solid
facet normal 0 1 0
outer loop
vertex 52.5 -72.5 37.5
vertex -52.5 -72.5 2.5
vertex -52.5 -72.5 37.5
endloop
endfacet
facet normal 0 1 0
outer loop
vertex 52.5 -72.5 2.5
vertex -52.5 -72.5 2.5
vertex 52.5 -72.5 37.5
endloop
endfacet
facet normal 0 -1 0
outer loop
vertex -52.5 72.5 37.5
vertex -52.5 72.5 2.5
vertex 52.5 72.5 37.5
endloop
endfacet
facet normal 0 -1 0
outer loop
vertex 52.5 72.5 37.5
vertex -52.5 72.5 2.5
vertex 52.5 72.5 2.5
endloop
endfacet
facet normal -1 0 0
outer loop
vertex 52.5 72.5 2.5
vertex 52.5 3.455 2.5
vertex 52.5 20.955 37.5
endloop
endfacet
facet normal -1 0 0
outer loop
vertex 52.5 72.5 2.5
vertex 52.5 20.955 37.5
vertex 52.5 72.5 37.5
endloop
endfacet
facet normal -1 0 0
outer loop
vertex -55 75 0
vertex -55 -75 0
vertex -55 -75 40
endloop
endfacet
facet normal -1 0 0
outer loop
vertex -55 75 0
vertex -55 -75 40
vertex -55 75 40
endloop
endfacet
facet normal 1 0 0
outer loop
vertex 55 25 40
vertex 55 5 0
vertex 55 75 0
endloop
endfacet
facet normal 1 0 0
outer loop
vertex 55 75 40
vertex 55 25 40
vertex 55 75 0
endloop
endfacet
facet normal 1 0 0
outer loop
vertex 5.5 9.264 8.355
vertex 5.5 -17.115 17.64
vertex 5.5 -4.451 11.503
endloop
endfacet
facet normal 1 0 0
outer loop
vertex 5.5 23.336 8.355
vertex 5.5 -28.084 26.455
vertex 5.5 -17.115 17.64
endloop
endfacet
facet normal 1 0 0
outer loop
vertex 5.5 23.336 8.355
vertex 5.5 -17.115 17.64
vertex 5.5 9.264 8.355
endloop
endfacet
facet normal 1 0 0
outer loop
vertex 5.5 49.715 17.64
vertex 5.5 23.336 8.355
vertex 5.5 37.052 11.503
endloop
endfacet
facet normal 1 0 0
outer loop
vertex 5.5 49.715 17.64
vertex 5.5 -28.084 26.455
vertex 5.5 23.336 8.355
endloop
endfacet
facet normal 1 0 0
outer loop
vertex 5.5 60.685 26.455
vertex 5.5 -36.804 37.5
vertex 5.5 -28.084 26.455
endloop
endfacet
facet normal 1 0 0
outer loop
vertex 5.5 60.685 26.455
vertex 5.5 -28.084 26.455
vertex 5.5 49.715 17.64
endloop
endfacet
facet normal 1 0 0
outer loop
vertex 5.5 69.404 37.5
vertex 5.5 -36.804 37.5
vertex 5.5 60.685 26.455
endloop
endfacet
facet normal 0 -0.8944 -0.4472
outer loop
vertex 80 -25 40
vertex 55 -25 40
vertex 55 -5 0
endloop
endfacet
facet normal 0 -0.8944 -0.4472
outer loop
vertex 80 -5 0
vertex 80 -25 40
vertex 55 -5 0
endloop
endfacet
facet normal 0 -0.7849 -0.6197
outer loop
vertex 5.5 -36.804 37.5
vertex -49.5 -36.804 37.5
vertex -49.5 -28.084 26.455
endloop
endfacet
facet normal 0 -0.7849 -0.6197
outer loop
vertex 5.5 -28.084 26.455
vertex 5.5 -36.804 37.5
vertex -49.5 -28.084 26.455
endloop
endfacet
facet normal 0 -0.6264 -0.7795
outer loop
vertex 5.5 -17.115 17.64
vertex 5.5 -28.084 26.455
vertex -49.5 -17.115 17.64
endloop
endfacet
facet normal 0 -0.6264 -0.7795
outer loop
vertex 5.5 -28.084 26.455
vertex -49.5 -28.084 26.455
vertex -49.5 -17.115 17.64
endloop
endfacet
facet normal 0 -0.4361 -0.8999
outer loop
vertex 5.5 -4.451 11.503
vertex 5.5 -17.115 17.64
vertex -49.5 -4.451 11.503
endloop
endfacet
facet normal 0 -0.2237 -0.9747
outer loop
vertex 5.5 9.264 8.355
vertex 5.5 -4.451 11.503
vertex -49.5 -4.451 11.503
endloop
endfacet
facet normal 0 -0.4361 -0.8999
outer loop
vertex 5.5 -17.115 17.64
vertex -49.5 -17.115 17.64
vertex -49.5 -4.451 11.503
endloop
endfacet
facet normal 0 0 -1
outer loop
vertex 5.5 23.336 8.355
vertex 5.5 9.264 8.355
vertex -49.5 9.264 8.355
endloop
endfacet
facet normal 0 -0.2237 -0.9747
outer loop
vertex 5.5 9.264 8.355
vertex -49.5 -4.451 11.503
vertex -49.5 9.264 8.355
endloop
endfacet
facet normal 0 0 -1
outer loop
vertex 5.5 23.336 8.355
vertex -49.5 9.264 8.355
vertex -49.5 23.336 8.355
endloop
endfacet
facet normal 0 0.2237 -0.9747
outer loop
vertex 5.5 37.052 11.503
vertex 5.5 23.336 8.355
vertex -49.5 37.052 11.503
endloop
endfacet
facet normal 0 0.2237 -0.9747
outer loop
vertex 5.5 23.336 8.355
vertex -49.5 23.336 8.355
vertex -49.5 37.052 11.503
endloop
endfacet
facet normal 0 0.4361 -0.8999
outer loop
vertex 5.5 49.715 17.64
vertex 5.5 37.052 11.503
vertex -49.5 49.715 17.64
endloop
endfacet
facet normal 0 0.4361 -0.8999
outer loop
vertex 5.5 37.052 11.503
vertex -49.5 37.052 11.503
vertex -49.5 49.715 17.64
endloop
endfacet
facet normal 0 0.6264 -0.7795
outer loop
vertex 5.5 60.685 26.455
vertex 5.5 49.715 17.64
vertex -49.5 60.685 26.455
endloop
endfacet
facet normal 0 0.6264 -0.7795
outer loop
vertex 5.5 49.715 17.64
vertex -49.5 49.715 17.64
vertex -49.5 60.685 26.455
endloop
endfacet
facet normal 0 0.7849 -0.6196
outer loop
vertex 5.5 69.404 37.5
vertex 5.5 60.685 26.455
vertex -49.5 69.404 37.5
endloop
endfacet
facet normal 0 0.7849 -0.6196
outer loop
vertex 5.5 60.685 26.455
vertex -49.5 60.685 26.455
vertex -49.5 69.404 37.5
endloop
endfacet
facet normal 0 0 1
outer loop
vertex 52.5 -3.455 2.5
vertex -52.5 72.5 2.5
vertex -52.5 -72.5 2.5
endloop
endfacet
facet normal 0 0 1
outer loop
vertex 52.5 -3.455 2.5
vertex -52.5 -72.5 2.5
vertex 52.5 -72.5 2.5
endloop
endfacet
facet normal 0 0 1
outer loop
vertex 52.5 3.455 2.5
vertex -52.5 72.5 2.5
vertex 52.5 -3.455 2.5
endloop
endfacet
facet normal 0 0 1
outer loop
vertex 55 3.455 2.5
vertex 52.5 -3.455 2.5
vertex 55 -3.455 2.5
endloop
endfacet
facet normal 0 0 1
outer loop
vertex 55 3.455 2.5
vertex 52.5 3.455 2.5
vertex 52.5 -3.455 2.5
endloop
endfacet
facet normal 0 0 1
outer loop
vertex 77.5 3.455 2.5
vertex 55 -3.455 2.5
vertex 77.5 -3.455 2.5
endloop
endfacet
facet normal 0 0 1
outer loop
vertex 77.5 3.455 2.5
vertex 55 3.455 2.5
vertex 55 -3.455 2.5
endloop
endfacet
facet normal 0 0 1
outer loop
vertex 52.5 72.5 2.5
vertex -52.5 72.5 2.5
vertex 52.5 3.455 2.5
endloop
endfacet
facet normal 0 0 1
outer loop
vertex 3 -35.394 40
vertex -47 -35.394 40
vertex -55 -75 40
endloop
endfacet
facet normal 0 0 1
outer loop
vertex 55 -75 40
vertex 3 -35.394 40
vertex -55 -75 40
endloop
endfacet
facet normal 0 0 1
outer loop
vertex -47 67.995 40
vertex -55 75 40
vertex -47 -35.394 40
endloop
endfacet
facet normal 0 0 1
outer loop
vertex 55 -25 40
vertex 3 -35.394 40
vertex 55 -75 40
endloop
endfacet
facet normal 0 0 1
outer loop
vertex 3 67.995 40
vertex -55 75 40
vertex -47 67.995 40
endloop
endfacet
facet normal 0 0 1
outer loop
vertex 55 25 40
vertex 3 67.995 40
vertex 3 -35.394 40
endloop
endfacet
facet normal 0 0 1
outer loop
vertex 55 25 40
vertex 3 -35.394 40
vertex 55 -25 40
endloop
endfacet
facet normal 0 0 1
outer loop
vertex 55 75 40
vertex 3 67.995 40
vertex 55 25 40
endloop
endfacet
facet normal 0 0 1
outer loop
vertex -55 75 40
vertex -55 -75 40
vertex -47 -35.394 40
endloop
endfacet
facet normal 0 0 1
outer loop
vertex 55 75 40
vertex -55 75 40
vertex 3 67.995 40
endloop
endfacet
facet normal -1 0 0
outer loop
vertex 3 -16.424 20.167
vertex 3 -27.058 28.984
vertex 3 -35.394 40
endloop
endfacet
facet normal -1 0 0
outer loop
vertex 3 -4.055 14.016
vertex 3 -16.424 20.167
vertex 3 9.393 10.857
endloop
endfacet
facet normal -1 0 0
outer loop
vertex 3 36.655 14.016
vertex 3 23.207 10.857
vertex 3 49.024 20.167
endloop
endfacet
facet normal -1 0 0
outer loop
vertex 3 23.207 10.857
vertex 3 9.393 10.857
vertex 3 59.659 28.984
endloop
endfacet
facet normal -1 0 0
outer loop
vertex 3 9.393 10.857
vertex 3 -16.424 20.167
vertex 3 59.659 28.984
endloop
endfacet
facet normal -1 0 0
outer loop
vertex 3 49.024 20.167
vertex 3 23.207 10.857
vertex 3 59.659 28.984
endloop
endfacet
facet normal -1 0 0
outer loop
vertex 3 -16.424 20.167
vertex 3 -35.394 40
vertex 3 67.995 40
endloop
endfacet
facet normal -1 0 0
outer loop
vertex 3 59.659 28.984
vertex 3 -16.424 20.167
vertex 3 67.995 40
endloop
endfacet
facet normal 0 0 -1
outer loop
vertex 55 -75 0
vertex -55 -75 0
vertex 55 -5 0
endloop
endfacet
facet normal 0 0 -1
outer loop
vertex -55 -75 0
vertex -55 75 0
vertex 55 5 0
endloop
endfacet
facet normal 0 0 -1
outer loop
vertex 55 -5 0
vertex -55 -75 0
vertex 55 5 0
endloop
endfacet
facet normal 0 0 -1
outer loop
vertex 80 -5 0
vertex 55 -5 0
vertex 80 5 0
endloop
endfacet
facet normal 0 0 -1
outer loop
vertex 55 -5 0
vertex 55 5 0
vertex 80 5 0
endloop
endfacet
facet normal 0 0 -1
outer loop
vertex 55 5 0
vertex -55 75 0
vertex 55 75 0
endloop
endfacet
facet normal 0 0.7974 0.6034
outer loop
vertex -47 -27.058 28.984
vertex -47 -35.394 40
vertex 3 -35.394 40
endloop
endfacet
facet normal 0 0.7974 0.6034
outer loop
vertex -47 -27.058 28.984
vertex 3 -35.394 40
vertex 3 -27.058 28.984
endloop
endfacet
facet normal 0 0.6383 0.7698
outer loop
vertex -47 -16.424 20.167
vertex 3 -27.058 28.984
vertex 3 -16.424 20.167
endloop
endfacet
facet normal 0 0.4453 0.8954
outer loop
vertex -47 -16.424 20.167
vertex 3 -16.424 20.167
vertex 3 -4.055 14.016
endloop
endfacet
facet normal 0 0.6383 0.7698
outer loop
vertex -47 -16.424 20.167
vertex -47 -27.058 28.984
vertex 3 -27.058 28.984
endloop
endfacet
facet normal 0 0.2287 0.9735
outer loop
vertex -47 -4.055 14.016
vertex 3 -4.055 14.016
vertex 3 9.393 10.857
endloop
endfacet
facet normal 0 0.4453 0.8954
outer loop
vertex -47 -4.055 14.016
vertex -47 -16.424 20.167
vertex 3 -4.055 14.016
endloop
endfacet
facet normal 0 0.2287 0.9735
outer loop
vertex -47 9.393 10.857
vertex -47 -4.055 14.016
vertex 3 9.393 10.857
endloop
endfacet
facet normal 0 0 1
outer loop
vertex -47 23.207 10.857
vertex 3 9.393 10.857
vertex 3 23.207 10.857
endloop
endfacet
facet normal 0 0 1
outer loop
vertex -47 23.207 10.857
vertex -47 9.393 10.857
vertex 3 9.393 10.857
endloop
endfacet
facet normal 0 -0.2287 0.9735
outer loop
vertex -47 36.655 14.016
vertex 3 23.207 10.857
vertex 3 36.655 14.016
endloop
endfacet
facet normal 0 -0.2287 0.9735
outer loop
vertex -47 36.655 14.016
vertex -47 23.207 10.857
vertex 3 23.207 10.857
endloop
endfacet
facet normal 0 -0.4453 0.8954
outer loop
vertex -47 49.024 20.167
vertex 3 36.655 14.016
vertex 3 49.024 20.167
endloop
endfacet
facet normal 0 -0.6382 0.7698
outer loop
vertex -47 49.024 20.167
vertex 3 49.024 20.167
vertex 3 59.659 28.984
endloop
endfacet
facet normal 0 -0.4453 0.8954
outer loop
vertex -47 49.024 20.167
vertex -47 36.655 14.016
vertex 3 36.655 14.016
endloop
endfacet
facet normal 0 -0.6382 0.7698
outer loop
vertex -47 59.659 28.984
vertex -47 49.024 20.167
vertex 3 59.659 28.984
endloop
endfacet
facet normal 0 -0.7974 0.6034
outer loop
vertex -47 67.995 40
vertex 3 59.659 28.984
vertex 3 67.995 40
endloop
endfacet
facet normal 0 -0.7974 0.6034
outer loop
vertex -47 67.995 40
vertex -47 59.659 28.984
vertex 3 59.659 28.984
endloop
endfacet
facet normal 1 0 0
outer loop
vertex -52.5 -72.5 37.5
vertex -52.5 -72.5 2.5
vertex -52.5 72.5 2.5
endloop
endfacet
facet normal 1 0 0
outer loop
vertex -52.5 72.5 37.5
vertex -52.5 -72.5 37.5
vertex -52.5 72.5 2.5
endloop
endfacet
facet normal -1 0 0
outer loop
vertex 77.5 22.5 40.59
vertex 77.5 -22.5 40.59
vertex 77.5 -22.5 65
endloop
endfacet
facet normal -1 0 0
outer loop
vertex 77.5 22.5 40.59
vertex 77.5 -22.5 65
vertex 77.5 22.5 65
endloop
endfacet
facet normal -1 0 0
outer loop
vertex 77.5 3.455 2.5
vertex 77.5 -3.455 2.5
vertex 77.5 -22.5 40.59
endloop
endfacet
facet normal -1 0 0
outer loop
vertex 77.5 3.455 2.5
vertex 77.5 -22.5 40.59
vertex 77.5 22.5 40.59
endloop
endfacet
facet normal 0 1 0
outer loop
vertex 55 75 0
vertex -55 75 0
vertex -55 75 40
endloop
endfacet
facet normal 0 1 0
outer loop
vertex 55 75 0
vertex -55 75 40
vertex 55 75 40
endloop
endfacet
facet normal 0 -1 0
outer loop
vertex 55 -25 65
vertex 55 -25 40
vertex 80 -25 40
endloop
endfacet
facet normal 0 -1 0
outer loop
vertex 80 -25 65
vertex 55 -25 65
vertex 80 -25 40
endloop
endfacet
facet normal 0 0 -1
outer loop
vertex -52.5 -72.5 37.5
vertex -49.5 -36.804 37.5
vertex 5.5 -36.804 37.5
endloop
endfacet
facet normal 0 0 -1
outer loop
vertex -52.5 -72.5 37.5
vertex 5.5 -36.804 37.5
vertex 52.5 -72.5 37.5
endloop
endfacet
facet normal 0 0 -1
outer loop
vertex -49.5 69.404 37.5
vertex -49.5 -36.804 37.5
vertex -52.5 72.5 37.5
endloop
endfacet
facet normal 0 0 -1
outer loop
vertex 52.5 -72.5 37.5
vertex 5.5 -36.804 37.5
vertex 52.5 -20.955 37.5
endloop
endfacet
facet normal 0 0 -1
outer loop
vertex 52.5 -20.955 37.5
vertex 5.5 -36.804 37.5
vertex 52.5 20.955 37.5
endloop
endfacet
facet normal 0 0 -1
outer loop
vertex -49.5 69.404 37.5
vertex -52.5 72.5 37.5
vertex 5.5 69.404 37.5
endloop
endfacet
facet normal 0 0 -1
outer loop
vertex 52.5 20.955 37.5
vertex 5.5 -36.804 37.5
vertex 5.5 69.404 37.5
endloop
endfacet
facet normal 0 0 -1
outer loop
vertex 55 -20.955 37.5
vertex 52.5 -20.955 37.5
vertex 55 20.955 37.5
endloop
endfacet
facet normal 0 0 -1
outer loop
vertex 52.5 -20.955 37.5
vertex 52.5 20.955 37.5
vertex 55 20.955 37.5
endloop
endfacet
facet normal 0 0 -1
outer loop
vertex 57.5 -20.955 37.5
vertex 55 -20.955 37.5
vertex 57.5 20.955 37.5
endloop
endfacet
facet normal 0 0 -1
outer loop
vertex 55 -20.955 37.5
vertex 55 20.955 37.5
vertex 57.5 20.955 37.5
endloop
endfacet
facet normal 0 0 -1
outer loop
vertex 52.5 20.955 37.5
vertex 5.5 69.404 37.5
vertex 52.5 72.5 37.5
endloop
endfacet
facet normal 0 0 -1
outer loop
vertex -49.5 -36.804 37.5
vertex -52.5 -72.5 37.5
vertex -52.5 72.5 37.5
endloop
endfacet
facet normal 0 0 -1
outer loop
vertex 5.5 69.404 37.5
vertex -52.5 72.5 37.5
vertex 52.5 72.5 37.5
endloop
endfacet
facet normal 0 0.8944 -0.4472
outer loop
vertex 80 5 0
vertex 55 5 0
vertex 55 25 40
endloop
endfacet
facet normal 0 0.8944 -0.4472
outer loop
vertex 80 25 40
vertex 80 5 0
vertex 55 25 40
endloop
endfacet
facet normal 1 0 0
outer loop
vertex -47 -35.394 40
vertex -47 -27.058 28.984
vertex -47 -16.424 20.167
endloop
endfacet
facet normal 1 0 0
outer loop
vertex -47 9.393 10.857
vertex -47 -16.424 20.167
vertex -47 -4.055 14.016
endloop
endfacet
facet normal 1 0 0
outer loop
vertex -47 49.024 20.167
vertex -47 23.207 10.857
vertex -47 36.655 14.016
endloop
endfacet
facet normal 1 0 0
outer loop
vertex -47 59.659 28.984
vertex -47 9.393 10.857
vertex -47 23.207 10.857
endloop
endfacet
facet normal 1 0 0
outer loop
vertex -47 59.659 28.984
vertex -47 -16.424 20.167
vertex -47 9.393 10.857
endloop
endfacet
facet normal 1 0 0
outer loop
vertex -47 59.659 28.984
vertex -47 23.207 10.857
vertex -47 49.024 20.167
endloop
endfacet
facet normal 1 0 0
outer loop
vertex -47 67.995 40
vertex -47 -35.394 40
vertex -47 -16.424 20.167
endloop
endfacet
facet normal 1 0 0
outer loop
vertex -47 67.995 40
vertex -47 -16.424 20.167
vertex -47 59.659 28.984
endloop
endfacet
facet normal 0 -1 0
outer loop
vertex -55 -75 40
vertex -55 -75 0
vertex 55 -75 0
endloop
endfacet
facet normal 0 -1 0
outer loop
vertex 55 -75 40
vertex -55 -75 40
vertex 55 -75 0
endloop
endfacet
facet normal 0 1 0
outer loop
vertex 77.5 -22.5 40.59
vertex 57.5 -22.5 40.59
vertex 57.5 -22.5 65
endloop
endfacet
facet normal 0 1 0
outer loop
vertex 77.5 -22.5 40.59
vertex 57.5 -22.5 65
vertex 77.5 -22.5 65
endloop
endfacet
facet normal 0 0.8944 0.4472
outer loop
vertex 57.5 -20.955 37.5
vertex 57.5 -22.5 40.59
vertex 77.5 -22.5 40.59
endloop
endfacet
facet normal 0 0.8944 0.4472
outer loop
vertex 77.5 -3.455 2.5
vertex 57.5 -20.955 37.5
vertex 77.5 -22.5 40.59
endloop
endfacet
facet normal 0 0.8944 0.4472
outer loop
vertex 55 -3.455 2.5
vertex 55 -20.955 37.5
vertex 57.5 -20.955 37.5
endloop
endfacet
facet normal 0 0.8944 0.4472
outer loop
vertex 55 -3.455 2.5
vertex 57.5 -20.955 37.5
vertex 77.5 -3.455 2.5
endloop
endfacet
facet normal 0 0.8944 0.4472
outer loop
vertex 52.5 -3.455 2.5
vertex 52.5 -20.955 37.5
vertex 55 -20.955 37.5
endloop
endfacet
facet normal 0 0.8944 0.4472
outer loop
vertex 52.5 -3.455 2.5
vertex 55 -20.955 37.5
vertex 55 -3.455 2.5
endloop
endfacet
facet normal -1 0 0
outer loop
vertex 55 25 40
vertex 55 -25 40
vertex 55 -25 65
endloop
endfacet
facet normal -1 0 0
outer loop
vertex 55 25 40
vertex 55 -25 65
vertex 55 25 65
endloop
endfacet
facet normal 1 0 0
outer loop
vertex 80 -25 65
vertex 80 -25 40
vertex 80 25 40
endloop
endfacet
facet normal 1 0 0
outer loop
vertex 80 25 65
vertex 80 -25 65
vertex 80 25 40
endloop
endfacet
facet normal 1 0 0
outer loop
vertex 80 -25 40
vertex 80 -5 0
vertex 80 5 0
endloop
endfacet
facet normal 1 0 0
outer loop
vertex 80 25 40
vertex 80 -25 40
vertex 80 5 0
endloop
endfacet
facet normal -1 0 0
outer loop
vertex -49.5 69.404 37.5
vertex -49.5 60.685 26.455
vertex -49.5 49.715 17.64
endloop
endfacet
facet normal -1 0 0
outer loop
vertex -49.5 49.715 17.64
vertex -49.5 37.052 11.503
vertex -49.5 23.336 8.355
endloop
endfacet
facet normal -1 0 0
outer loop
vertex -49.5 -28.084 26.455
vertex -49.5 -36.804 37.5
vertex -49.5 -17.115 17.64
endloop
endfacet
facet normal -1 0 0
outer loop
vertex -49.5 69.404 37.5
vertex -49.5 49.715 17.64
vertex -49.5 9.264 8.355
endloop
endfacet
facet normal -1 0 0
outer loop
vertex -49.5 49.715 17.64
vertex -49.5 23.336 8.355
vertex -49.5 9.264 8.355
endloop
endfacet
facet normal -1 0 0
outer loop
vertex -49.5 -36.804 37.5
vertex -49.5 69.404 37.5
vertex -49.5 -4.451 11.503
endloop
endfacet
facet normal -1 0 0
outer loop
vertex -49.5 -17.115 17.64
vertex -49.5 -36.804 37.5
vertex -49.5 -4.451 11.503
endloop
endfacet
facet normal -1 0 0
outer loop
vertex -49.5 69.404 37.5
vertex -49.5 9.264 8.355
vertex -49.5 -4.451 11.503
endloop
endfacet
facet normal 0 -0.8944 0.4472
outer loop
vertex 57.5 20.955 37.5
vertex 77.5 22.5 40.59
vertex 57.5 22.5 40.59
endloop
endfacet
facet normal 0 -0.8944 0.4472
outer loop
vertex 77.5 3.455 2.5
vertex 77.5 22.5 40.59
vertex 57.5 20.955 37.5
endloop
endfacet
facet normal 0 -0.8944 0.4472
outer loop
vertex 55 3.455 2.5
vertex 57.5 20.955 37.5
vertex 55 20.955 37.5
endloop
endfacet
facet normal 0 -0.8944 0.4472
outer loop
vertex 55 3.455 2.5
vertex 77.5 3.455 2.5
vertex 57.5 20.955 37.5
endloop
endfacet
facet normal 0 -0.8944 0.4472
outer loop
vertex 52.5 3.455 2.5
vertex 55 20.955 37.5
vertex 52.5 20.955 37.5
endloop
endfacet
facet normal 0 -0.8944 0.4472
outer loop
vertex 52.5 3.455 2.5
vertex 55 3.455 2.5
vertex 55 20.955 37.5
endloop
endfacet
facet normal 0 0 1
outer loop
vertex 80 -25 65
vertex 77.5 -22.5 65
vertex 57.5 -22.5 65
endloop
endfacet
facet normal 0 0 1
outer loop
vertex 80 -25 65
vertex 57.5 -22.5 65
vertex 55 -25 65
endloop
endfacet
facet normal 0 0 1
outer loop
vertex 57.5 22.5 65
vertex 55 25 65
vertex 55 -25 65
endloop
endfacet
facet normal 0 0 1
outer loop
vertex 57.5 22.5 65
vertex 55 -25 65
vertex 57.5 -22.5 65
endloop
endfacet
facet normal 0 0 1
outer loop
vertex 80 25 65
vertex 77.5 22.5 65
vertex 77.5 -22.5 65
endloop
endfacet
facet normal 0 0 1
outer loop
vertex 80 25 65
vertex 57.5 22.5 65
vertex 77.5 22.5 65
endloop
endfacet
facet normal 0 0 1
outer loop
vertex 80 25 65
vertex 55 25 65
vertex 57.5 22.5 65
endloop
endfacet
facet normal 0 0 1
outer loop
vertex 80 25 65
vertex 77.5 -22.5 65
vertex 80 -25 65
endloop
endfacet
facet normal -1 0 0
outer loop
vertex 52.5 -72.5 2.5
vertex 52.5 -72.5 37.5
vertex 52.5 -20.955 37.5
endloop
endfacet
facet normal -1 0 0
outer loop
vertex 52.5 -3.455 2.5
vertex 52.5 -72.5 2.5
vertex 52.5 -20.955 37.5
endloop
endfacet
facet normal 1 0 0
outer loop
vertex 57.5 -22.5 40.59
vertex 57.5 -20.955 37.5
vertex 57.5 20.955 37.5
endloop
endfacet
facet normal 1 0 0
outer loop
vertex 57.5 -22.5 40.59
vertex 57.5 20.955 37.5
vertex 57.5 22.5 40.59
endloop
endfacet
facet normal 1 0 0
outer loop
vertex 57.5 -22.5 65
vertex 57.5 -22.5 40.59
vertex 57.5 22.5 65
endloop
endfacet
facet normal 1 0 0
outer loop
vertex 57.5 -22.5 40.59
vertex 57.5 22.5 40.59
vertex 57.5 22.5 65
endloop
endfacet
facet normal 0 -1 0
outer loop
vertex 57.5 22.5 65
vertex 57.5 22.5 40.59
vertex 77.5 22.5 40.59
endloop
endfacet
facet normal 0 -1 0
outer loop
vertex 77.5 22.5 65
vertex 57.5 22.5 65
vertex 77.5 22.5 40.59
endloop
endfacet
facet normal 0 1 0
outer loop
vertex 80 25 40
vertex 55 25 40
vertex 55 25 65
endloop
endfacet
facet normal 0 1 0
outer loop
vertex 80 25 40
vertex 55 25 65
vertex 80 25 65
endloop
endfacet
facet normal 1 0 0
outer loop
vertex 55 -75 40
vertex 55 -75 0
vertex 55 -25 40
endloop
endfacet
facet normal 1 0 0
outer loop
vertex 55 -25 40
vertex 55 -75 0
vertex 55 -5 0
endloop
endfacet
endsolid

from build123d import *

# Parameters (mm, degrees)
F0_W         = 110
F0_H         = 150
F1_DEPTH     = 40
F3_R         = 60
F4_DEPTH     = 50
F6_DEPTH     = 25
F7_W         = 25
F7_H         = 50
F8_DEPTH     = 25
F9_T         = 2.5
F9_T3_DEPTH  = 49.72135955
F9_T5_DEPTH  = 55
F9_T7_DEPTH  = 49.72135955
F9_T10_ANGLE = 118.9875137878
F9_T12_ANGLE = 118.9875137878


# Not quite as in the source:
# - a shell that OpenCascade refuses in one call is made with other operations: the cavity is built on its own and cut out


with BuildPart() as f1:
    # F0 (on Top) → F1 (new body)
    with BuildSketch(Plane.XY):
        Rectangle(F0_W, F0_H)
    extrude(amount=F1_DEPTH)

    # F3 (on offset) → F4 (cut)
    with BuildSketch(Plane.YZ.offset(-47)):
        with Locations((16.3003693058, 70.4579347266)):
            Circle(F3_R)
    extrude(amount=F4_DEPTH, mode=Mode.SUBTRACT)

    # F5 (on face) → F6 (join)
    with BuildSketch(Plane.YZ.offset(55)):
        Polygon((-5, 0), (5, 0), (25, 40), (-25, 40), align=None)
    extrude(amount=F6_DEPTH)

    # F7 (on face) → F8 (join)
    with BuildSketch(Plane.XY.offset(40)):
        with Locations((67.5, 0)):
            Rectangle(F7_W, F7_H)
    extrude(amount=F8_DEPTH)

    # F9: shell of thickness 2.5, made by hand


with BuildPart() as f9_core1:
    # F9_t2: copy of F1
    add(f1.part)

    # the walls: a layer under each face that stays
    f9_faces = [f9_core1.faces().sort_by_distance(p)[0] for p in [
        (0, -75, 20),
        (-55, 0, 20),
        (55, -40, 20),
        (12.5, 0, 0),
        (-36.6666666667, -50, 40),
        (0, 75, 20),
        (67.5, -15, 20),
        (80, 0, 32.5),
        (67.5, 15, 20),
        (55, 40, 20),
        (55, 0, 52.5),
        (3, 16.3003693058, 25.2289673633),
        (-22, 16.3003693058, 10.4579347266),
        (-47, 16.3003693058, 25.2289673633),
        (67.5, -25, 52.5),
        (67.5, 25, 52.5),
    ]]
    thicken(f9_faces, amount=-F9_T, mode=Mode.SUBTRACT)

    # F9_s4 → F9_t3 (cut)
    with BuildSketch(Plane(origin=(0, -22.1180339887, 44.2360679775), x_dir=(1, 0, 0), z_dir=(0, 0.4472135955, -0.894427191))):
        Polygon((55.025, 4.497135955), (52.5, 4.472135955), (52.5, 1.972135955), (55, 1.972135955), align=None)
    extrude(amount=F9_T3_DEPTH, mode=Mode.SUBTRACT)

    # F9_s6 → F9_t5 (cut)
    with BuildSketch(Plane.XZ.offset(-27.5)):
        Polygon((54.975, 40.025), (55, 37.5), (57.5, 37.5), (57.5, 40), align=None)
    extrude(amount=F9_T5_DEPTH, mode=Mode.SUBTRACT)

    # F9_s8 → F9_t7 (cut)
    with BuildSketch(Plane(origin=(0, -0.1180339887, -0.2360679775), x_dir=(1, 0, 0), z_dir=(0, 0.4472135955, 0.894427191))):
        Polygon((55.025, 4.497135955), (55, 1.972135955), (52.5, 1.972135955), (52.5, 4.472135955), align=None)
    extrude(amount=F9_T7_DEPTH, mode=Mode.SUBTRACT)

    # F9_s9 → F9_t10 (revolve, cut)
    with BuildSketch(Plane(origin=(0, -26.6152201498, 45.172421505), x_dir=(1, 0, 0), z_dir=(0, -0.5076322454, 0.8615738525))):
        Polygon((2.975, -10.1643084047), (5.5, -10.1893084047), (5.5, -12.6893084047), (3, -12.6893084047), align=None)
    revolve(axis=Axis((3, 16.3003693058, 70.4579347266), (1, 0, 0)), revolution_arc=F9_T10_ANGLE, mode=Mode.SUBTRACT)

    # F9_s11 → F9_t12 (revolve, cut)
    with BuildSketch(Plane(origin=(0, -26.6152201498, 45.172421505), x_dir=(1, 0, 0), z_dir=(0, -0.5076322454, 0.8615738525))):
        Polygon((-46.975, -10.1643084047), (-47, -12.6893084047), (-49.5, -12.6893084047), (-49.5, -10.1893084047), align=None)
    revolve(axis=Axis((-47, 16.3003693058, 70.4579347266), (1, 0, 0)), revolution_arc=F9_T12_ANGLE, mode=Mode.SUBTRACT)


with BuildPart() as f1_1:
    add(f1.part)

    # what is left inside the walls is the cavity
    f9_cavity = [f9_core1.part.solids().sort_by_distance(p)[0] for p in [
        (12.5, -24.166667, 2.525),
    ]]
    add(f9_cavity, mode=Mode.SUBTRACT)


solid = f1_1.part
